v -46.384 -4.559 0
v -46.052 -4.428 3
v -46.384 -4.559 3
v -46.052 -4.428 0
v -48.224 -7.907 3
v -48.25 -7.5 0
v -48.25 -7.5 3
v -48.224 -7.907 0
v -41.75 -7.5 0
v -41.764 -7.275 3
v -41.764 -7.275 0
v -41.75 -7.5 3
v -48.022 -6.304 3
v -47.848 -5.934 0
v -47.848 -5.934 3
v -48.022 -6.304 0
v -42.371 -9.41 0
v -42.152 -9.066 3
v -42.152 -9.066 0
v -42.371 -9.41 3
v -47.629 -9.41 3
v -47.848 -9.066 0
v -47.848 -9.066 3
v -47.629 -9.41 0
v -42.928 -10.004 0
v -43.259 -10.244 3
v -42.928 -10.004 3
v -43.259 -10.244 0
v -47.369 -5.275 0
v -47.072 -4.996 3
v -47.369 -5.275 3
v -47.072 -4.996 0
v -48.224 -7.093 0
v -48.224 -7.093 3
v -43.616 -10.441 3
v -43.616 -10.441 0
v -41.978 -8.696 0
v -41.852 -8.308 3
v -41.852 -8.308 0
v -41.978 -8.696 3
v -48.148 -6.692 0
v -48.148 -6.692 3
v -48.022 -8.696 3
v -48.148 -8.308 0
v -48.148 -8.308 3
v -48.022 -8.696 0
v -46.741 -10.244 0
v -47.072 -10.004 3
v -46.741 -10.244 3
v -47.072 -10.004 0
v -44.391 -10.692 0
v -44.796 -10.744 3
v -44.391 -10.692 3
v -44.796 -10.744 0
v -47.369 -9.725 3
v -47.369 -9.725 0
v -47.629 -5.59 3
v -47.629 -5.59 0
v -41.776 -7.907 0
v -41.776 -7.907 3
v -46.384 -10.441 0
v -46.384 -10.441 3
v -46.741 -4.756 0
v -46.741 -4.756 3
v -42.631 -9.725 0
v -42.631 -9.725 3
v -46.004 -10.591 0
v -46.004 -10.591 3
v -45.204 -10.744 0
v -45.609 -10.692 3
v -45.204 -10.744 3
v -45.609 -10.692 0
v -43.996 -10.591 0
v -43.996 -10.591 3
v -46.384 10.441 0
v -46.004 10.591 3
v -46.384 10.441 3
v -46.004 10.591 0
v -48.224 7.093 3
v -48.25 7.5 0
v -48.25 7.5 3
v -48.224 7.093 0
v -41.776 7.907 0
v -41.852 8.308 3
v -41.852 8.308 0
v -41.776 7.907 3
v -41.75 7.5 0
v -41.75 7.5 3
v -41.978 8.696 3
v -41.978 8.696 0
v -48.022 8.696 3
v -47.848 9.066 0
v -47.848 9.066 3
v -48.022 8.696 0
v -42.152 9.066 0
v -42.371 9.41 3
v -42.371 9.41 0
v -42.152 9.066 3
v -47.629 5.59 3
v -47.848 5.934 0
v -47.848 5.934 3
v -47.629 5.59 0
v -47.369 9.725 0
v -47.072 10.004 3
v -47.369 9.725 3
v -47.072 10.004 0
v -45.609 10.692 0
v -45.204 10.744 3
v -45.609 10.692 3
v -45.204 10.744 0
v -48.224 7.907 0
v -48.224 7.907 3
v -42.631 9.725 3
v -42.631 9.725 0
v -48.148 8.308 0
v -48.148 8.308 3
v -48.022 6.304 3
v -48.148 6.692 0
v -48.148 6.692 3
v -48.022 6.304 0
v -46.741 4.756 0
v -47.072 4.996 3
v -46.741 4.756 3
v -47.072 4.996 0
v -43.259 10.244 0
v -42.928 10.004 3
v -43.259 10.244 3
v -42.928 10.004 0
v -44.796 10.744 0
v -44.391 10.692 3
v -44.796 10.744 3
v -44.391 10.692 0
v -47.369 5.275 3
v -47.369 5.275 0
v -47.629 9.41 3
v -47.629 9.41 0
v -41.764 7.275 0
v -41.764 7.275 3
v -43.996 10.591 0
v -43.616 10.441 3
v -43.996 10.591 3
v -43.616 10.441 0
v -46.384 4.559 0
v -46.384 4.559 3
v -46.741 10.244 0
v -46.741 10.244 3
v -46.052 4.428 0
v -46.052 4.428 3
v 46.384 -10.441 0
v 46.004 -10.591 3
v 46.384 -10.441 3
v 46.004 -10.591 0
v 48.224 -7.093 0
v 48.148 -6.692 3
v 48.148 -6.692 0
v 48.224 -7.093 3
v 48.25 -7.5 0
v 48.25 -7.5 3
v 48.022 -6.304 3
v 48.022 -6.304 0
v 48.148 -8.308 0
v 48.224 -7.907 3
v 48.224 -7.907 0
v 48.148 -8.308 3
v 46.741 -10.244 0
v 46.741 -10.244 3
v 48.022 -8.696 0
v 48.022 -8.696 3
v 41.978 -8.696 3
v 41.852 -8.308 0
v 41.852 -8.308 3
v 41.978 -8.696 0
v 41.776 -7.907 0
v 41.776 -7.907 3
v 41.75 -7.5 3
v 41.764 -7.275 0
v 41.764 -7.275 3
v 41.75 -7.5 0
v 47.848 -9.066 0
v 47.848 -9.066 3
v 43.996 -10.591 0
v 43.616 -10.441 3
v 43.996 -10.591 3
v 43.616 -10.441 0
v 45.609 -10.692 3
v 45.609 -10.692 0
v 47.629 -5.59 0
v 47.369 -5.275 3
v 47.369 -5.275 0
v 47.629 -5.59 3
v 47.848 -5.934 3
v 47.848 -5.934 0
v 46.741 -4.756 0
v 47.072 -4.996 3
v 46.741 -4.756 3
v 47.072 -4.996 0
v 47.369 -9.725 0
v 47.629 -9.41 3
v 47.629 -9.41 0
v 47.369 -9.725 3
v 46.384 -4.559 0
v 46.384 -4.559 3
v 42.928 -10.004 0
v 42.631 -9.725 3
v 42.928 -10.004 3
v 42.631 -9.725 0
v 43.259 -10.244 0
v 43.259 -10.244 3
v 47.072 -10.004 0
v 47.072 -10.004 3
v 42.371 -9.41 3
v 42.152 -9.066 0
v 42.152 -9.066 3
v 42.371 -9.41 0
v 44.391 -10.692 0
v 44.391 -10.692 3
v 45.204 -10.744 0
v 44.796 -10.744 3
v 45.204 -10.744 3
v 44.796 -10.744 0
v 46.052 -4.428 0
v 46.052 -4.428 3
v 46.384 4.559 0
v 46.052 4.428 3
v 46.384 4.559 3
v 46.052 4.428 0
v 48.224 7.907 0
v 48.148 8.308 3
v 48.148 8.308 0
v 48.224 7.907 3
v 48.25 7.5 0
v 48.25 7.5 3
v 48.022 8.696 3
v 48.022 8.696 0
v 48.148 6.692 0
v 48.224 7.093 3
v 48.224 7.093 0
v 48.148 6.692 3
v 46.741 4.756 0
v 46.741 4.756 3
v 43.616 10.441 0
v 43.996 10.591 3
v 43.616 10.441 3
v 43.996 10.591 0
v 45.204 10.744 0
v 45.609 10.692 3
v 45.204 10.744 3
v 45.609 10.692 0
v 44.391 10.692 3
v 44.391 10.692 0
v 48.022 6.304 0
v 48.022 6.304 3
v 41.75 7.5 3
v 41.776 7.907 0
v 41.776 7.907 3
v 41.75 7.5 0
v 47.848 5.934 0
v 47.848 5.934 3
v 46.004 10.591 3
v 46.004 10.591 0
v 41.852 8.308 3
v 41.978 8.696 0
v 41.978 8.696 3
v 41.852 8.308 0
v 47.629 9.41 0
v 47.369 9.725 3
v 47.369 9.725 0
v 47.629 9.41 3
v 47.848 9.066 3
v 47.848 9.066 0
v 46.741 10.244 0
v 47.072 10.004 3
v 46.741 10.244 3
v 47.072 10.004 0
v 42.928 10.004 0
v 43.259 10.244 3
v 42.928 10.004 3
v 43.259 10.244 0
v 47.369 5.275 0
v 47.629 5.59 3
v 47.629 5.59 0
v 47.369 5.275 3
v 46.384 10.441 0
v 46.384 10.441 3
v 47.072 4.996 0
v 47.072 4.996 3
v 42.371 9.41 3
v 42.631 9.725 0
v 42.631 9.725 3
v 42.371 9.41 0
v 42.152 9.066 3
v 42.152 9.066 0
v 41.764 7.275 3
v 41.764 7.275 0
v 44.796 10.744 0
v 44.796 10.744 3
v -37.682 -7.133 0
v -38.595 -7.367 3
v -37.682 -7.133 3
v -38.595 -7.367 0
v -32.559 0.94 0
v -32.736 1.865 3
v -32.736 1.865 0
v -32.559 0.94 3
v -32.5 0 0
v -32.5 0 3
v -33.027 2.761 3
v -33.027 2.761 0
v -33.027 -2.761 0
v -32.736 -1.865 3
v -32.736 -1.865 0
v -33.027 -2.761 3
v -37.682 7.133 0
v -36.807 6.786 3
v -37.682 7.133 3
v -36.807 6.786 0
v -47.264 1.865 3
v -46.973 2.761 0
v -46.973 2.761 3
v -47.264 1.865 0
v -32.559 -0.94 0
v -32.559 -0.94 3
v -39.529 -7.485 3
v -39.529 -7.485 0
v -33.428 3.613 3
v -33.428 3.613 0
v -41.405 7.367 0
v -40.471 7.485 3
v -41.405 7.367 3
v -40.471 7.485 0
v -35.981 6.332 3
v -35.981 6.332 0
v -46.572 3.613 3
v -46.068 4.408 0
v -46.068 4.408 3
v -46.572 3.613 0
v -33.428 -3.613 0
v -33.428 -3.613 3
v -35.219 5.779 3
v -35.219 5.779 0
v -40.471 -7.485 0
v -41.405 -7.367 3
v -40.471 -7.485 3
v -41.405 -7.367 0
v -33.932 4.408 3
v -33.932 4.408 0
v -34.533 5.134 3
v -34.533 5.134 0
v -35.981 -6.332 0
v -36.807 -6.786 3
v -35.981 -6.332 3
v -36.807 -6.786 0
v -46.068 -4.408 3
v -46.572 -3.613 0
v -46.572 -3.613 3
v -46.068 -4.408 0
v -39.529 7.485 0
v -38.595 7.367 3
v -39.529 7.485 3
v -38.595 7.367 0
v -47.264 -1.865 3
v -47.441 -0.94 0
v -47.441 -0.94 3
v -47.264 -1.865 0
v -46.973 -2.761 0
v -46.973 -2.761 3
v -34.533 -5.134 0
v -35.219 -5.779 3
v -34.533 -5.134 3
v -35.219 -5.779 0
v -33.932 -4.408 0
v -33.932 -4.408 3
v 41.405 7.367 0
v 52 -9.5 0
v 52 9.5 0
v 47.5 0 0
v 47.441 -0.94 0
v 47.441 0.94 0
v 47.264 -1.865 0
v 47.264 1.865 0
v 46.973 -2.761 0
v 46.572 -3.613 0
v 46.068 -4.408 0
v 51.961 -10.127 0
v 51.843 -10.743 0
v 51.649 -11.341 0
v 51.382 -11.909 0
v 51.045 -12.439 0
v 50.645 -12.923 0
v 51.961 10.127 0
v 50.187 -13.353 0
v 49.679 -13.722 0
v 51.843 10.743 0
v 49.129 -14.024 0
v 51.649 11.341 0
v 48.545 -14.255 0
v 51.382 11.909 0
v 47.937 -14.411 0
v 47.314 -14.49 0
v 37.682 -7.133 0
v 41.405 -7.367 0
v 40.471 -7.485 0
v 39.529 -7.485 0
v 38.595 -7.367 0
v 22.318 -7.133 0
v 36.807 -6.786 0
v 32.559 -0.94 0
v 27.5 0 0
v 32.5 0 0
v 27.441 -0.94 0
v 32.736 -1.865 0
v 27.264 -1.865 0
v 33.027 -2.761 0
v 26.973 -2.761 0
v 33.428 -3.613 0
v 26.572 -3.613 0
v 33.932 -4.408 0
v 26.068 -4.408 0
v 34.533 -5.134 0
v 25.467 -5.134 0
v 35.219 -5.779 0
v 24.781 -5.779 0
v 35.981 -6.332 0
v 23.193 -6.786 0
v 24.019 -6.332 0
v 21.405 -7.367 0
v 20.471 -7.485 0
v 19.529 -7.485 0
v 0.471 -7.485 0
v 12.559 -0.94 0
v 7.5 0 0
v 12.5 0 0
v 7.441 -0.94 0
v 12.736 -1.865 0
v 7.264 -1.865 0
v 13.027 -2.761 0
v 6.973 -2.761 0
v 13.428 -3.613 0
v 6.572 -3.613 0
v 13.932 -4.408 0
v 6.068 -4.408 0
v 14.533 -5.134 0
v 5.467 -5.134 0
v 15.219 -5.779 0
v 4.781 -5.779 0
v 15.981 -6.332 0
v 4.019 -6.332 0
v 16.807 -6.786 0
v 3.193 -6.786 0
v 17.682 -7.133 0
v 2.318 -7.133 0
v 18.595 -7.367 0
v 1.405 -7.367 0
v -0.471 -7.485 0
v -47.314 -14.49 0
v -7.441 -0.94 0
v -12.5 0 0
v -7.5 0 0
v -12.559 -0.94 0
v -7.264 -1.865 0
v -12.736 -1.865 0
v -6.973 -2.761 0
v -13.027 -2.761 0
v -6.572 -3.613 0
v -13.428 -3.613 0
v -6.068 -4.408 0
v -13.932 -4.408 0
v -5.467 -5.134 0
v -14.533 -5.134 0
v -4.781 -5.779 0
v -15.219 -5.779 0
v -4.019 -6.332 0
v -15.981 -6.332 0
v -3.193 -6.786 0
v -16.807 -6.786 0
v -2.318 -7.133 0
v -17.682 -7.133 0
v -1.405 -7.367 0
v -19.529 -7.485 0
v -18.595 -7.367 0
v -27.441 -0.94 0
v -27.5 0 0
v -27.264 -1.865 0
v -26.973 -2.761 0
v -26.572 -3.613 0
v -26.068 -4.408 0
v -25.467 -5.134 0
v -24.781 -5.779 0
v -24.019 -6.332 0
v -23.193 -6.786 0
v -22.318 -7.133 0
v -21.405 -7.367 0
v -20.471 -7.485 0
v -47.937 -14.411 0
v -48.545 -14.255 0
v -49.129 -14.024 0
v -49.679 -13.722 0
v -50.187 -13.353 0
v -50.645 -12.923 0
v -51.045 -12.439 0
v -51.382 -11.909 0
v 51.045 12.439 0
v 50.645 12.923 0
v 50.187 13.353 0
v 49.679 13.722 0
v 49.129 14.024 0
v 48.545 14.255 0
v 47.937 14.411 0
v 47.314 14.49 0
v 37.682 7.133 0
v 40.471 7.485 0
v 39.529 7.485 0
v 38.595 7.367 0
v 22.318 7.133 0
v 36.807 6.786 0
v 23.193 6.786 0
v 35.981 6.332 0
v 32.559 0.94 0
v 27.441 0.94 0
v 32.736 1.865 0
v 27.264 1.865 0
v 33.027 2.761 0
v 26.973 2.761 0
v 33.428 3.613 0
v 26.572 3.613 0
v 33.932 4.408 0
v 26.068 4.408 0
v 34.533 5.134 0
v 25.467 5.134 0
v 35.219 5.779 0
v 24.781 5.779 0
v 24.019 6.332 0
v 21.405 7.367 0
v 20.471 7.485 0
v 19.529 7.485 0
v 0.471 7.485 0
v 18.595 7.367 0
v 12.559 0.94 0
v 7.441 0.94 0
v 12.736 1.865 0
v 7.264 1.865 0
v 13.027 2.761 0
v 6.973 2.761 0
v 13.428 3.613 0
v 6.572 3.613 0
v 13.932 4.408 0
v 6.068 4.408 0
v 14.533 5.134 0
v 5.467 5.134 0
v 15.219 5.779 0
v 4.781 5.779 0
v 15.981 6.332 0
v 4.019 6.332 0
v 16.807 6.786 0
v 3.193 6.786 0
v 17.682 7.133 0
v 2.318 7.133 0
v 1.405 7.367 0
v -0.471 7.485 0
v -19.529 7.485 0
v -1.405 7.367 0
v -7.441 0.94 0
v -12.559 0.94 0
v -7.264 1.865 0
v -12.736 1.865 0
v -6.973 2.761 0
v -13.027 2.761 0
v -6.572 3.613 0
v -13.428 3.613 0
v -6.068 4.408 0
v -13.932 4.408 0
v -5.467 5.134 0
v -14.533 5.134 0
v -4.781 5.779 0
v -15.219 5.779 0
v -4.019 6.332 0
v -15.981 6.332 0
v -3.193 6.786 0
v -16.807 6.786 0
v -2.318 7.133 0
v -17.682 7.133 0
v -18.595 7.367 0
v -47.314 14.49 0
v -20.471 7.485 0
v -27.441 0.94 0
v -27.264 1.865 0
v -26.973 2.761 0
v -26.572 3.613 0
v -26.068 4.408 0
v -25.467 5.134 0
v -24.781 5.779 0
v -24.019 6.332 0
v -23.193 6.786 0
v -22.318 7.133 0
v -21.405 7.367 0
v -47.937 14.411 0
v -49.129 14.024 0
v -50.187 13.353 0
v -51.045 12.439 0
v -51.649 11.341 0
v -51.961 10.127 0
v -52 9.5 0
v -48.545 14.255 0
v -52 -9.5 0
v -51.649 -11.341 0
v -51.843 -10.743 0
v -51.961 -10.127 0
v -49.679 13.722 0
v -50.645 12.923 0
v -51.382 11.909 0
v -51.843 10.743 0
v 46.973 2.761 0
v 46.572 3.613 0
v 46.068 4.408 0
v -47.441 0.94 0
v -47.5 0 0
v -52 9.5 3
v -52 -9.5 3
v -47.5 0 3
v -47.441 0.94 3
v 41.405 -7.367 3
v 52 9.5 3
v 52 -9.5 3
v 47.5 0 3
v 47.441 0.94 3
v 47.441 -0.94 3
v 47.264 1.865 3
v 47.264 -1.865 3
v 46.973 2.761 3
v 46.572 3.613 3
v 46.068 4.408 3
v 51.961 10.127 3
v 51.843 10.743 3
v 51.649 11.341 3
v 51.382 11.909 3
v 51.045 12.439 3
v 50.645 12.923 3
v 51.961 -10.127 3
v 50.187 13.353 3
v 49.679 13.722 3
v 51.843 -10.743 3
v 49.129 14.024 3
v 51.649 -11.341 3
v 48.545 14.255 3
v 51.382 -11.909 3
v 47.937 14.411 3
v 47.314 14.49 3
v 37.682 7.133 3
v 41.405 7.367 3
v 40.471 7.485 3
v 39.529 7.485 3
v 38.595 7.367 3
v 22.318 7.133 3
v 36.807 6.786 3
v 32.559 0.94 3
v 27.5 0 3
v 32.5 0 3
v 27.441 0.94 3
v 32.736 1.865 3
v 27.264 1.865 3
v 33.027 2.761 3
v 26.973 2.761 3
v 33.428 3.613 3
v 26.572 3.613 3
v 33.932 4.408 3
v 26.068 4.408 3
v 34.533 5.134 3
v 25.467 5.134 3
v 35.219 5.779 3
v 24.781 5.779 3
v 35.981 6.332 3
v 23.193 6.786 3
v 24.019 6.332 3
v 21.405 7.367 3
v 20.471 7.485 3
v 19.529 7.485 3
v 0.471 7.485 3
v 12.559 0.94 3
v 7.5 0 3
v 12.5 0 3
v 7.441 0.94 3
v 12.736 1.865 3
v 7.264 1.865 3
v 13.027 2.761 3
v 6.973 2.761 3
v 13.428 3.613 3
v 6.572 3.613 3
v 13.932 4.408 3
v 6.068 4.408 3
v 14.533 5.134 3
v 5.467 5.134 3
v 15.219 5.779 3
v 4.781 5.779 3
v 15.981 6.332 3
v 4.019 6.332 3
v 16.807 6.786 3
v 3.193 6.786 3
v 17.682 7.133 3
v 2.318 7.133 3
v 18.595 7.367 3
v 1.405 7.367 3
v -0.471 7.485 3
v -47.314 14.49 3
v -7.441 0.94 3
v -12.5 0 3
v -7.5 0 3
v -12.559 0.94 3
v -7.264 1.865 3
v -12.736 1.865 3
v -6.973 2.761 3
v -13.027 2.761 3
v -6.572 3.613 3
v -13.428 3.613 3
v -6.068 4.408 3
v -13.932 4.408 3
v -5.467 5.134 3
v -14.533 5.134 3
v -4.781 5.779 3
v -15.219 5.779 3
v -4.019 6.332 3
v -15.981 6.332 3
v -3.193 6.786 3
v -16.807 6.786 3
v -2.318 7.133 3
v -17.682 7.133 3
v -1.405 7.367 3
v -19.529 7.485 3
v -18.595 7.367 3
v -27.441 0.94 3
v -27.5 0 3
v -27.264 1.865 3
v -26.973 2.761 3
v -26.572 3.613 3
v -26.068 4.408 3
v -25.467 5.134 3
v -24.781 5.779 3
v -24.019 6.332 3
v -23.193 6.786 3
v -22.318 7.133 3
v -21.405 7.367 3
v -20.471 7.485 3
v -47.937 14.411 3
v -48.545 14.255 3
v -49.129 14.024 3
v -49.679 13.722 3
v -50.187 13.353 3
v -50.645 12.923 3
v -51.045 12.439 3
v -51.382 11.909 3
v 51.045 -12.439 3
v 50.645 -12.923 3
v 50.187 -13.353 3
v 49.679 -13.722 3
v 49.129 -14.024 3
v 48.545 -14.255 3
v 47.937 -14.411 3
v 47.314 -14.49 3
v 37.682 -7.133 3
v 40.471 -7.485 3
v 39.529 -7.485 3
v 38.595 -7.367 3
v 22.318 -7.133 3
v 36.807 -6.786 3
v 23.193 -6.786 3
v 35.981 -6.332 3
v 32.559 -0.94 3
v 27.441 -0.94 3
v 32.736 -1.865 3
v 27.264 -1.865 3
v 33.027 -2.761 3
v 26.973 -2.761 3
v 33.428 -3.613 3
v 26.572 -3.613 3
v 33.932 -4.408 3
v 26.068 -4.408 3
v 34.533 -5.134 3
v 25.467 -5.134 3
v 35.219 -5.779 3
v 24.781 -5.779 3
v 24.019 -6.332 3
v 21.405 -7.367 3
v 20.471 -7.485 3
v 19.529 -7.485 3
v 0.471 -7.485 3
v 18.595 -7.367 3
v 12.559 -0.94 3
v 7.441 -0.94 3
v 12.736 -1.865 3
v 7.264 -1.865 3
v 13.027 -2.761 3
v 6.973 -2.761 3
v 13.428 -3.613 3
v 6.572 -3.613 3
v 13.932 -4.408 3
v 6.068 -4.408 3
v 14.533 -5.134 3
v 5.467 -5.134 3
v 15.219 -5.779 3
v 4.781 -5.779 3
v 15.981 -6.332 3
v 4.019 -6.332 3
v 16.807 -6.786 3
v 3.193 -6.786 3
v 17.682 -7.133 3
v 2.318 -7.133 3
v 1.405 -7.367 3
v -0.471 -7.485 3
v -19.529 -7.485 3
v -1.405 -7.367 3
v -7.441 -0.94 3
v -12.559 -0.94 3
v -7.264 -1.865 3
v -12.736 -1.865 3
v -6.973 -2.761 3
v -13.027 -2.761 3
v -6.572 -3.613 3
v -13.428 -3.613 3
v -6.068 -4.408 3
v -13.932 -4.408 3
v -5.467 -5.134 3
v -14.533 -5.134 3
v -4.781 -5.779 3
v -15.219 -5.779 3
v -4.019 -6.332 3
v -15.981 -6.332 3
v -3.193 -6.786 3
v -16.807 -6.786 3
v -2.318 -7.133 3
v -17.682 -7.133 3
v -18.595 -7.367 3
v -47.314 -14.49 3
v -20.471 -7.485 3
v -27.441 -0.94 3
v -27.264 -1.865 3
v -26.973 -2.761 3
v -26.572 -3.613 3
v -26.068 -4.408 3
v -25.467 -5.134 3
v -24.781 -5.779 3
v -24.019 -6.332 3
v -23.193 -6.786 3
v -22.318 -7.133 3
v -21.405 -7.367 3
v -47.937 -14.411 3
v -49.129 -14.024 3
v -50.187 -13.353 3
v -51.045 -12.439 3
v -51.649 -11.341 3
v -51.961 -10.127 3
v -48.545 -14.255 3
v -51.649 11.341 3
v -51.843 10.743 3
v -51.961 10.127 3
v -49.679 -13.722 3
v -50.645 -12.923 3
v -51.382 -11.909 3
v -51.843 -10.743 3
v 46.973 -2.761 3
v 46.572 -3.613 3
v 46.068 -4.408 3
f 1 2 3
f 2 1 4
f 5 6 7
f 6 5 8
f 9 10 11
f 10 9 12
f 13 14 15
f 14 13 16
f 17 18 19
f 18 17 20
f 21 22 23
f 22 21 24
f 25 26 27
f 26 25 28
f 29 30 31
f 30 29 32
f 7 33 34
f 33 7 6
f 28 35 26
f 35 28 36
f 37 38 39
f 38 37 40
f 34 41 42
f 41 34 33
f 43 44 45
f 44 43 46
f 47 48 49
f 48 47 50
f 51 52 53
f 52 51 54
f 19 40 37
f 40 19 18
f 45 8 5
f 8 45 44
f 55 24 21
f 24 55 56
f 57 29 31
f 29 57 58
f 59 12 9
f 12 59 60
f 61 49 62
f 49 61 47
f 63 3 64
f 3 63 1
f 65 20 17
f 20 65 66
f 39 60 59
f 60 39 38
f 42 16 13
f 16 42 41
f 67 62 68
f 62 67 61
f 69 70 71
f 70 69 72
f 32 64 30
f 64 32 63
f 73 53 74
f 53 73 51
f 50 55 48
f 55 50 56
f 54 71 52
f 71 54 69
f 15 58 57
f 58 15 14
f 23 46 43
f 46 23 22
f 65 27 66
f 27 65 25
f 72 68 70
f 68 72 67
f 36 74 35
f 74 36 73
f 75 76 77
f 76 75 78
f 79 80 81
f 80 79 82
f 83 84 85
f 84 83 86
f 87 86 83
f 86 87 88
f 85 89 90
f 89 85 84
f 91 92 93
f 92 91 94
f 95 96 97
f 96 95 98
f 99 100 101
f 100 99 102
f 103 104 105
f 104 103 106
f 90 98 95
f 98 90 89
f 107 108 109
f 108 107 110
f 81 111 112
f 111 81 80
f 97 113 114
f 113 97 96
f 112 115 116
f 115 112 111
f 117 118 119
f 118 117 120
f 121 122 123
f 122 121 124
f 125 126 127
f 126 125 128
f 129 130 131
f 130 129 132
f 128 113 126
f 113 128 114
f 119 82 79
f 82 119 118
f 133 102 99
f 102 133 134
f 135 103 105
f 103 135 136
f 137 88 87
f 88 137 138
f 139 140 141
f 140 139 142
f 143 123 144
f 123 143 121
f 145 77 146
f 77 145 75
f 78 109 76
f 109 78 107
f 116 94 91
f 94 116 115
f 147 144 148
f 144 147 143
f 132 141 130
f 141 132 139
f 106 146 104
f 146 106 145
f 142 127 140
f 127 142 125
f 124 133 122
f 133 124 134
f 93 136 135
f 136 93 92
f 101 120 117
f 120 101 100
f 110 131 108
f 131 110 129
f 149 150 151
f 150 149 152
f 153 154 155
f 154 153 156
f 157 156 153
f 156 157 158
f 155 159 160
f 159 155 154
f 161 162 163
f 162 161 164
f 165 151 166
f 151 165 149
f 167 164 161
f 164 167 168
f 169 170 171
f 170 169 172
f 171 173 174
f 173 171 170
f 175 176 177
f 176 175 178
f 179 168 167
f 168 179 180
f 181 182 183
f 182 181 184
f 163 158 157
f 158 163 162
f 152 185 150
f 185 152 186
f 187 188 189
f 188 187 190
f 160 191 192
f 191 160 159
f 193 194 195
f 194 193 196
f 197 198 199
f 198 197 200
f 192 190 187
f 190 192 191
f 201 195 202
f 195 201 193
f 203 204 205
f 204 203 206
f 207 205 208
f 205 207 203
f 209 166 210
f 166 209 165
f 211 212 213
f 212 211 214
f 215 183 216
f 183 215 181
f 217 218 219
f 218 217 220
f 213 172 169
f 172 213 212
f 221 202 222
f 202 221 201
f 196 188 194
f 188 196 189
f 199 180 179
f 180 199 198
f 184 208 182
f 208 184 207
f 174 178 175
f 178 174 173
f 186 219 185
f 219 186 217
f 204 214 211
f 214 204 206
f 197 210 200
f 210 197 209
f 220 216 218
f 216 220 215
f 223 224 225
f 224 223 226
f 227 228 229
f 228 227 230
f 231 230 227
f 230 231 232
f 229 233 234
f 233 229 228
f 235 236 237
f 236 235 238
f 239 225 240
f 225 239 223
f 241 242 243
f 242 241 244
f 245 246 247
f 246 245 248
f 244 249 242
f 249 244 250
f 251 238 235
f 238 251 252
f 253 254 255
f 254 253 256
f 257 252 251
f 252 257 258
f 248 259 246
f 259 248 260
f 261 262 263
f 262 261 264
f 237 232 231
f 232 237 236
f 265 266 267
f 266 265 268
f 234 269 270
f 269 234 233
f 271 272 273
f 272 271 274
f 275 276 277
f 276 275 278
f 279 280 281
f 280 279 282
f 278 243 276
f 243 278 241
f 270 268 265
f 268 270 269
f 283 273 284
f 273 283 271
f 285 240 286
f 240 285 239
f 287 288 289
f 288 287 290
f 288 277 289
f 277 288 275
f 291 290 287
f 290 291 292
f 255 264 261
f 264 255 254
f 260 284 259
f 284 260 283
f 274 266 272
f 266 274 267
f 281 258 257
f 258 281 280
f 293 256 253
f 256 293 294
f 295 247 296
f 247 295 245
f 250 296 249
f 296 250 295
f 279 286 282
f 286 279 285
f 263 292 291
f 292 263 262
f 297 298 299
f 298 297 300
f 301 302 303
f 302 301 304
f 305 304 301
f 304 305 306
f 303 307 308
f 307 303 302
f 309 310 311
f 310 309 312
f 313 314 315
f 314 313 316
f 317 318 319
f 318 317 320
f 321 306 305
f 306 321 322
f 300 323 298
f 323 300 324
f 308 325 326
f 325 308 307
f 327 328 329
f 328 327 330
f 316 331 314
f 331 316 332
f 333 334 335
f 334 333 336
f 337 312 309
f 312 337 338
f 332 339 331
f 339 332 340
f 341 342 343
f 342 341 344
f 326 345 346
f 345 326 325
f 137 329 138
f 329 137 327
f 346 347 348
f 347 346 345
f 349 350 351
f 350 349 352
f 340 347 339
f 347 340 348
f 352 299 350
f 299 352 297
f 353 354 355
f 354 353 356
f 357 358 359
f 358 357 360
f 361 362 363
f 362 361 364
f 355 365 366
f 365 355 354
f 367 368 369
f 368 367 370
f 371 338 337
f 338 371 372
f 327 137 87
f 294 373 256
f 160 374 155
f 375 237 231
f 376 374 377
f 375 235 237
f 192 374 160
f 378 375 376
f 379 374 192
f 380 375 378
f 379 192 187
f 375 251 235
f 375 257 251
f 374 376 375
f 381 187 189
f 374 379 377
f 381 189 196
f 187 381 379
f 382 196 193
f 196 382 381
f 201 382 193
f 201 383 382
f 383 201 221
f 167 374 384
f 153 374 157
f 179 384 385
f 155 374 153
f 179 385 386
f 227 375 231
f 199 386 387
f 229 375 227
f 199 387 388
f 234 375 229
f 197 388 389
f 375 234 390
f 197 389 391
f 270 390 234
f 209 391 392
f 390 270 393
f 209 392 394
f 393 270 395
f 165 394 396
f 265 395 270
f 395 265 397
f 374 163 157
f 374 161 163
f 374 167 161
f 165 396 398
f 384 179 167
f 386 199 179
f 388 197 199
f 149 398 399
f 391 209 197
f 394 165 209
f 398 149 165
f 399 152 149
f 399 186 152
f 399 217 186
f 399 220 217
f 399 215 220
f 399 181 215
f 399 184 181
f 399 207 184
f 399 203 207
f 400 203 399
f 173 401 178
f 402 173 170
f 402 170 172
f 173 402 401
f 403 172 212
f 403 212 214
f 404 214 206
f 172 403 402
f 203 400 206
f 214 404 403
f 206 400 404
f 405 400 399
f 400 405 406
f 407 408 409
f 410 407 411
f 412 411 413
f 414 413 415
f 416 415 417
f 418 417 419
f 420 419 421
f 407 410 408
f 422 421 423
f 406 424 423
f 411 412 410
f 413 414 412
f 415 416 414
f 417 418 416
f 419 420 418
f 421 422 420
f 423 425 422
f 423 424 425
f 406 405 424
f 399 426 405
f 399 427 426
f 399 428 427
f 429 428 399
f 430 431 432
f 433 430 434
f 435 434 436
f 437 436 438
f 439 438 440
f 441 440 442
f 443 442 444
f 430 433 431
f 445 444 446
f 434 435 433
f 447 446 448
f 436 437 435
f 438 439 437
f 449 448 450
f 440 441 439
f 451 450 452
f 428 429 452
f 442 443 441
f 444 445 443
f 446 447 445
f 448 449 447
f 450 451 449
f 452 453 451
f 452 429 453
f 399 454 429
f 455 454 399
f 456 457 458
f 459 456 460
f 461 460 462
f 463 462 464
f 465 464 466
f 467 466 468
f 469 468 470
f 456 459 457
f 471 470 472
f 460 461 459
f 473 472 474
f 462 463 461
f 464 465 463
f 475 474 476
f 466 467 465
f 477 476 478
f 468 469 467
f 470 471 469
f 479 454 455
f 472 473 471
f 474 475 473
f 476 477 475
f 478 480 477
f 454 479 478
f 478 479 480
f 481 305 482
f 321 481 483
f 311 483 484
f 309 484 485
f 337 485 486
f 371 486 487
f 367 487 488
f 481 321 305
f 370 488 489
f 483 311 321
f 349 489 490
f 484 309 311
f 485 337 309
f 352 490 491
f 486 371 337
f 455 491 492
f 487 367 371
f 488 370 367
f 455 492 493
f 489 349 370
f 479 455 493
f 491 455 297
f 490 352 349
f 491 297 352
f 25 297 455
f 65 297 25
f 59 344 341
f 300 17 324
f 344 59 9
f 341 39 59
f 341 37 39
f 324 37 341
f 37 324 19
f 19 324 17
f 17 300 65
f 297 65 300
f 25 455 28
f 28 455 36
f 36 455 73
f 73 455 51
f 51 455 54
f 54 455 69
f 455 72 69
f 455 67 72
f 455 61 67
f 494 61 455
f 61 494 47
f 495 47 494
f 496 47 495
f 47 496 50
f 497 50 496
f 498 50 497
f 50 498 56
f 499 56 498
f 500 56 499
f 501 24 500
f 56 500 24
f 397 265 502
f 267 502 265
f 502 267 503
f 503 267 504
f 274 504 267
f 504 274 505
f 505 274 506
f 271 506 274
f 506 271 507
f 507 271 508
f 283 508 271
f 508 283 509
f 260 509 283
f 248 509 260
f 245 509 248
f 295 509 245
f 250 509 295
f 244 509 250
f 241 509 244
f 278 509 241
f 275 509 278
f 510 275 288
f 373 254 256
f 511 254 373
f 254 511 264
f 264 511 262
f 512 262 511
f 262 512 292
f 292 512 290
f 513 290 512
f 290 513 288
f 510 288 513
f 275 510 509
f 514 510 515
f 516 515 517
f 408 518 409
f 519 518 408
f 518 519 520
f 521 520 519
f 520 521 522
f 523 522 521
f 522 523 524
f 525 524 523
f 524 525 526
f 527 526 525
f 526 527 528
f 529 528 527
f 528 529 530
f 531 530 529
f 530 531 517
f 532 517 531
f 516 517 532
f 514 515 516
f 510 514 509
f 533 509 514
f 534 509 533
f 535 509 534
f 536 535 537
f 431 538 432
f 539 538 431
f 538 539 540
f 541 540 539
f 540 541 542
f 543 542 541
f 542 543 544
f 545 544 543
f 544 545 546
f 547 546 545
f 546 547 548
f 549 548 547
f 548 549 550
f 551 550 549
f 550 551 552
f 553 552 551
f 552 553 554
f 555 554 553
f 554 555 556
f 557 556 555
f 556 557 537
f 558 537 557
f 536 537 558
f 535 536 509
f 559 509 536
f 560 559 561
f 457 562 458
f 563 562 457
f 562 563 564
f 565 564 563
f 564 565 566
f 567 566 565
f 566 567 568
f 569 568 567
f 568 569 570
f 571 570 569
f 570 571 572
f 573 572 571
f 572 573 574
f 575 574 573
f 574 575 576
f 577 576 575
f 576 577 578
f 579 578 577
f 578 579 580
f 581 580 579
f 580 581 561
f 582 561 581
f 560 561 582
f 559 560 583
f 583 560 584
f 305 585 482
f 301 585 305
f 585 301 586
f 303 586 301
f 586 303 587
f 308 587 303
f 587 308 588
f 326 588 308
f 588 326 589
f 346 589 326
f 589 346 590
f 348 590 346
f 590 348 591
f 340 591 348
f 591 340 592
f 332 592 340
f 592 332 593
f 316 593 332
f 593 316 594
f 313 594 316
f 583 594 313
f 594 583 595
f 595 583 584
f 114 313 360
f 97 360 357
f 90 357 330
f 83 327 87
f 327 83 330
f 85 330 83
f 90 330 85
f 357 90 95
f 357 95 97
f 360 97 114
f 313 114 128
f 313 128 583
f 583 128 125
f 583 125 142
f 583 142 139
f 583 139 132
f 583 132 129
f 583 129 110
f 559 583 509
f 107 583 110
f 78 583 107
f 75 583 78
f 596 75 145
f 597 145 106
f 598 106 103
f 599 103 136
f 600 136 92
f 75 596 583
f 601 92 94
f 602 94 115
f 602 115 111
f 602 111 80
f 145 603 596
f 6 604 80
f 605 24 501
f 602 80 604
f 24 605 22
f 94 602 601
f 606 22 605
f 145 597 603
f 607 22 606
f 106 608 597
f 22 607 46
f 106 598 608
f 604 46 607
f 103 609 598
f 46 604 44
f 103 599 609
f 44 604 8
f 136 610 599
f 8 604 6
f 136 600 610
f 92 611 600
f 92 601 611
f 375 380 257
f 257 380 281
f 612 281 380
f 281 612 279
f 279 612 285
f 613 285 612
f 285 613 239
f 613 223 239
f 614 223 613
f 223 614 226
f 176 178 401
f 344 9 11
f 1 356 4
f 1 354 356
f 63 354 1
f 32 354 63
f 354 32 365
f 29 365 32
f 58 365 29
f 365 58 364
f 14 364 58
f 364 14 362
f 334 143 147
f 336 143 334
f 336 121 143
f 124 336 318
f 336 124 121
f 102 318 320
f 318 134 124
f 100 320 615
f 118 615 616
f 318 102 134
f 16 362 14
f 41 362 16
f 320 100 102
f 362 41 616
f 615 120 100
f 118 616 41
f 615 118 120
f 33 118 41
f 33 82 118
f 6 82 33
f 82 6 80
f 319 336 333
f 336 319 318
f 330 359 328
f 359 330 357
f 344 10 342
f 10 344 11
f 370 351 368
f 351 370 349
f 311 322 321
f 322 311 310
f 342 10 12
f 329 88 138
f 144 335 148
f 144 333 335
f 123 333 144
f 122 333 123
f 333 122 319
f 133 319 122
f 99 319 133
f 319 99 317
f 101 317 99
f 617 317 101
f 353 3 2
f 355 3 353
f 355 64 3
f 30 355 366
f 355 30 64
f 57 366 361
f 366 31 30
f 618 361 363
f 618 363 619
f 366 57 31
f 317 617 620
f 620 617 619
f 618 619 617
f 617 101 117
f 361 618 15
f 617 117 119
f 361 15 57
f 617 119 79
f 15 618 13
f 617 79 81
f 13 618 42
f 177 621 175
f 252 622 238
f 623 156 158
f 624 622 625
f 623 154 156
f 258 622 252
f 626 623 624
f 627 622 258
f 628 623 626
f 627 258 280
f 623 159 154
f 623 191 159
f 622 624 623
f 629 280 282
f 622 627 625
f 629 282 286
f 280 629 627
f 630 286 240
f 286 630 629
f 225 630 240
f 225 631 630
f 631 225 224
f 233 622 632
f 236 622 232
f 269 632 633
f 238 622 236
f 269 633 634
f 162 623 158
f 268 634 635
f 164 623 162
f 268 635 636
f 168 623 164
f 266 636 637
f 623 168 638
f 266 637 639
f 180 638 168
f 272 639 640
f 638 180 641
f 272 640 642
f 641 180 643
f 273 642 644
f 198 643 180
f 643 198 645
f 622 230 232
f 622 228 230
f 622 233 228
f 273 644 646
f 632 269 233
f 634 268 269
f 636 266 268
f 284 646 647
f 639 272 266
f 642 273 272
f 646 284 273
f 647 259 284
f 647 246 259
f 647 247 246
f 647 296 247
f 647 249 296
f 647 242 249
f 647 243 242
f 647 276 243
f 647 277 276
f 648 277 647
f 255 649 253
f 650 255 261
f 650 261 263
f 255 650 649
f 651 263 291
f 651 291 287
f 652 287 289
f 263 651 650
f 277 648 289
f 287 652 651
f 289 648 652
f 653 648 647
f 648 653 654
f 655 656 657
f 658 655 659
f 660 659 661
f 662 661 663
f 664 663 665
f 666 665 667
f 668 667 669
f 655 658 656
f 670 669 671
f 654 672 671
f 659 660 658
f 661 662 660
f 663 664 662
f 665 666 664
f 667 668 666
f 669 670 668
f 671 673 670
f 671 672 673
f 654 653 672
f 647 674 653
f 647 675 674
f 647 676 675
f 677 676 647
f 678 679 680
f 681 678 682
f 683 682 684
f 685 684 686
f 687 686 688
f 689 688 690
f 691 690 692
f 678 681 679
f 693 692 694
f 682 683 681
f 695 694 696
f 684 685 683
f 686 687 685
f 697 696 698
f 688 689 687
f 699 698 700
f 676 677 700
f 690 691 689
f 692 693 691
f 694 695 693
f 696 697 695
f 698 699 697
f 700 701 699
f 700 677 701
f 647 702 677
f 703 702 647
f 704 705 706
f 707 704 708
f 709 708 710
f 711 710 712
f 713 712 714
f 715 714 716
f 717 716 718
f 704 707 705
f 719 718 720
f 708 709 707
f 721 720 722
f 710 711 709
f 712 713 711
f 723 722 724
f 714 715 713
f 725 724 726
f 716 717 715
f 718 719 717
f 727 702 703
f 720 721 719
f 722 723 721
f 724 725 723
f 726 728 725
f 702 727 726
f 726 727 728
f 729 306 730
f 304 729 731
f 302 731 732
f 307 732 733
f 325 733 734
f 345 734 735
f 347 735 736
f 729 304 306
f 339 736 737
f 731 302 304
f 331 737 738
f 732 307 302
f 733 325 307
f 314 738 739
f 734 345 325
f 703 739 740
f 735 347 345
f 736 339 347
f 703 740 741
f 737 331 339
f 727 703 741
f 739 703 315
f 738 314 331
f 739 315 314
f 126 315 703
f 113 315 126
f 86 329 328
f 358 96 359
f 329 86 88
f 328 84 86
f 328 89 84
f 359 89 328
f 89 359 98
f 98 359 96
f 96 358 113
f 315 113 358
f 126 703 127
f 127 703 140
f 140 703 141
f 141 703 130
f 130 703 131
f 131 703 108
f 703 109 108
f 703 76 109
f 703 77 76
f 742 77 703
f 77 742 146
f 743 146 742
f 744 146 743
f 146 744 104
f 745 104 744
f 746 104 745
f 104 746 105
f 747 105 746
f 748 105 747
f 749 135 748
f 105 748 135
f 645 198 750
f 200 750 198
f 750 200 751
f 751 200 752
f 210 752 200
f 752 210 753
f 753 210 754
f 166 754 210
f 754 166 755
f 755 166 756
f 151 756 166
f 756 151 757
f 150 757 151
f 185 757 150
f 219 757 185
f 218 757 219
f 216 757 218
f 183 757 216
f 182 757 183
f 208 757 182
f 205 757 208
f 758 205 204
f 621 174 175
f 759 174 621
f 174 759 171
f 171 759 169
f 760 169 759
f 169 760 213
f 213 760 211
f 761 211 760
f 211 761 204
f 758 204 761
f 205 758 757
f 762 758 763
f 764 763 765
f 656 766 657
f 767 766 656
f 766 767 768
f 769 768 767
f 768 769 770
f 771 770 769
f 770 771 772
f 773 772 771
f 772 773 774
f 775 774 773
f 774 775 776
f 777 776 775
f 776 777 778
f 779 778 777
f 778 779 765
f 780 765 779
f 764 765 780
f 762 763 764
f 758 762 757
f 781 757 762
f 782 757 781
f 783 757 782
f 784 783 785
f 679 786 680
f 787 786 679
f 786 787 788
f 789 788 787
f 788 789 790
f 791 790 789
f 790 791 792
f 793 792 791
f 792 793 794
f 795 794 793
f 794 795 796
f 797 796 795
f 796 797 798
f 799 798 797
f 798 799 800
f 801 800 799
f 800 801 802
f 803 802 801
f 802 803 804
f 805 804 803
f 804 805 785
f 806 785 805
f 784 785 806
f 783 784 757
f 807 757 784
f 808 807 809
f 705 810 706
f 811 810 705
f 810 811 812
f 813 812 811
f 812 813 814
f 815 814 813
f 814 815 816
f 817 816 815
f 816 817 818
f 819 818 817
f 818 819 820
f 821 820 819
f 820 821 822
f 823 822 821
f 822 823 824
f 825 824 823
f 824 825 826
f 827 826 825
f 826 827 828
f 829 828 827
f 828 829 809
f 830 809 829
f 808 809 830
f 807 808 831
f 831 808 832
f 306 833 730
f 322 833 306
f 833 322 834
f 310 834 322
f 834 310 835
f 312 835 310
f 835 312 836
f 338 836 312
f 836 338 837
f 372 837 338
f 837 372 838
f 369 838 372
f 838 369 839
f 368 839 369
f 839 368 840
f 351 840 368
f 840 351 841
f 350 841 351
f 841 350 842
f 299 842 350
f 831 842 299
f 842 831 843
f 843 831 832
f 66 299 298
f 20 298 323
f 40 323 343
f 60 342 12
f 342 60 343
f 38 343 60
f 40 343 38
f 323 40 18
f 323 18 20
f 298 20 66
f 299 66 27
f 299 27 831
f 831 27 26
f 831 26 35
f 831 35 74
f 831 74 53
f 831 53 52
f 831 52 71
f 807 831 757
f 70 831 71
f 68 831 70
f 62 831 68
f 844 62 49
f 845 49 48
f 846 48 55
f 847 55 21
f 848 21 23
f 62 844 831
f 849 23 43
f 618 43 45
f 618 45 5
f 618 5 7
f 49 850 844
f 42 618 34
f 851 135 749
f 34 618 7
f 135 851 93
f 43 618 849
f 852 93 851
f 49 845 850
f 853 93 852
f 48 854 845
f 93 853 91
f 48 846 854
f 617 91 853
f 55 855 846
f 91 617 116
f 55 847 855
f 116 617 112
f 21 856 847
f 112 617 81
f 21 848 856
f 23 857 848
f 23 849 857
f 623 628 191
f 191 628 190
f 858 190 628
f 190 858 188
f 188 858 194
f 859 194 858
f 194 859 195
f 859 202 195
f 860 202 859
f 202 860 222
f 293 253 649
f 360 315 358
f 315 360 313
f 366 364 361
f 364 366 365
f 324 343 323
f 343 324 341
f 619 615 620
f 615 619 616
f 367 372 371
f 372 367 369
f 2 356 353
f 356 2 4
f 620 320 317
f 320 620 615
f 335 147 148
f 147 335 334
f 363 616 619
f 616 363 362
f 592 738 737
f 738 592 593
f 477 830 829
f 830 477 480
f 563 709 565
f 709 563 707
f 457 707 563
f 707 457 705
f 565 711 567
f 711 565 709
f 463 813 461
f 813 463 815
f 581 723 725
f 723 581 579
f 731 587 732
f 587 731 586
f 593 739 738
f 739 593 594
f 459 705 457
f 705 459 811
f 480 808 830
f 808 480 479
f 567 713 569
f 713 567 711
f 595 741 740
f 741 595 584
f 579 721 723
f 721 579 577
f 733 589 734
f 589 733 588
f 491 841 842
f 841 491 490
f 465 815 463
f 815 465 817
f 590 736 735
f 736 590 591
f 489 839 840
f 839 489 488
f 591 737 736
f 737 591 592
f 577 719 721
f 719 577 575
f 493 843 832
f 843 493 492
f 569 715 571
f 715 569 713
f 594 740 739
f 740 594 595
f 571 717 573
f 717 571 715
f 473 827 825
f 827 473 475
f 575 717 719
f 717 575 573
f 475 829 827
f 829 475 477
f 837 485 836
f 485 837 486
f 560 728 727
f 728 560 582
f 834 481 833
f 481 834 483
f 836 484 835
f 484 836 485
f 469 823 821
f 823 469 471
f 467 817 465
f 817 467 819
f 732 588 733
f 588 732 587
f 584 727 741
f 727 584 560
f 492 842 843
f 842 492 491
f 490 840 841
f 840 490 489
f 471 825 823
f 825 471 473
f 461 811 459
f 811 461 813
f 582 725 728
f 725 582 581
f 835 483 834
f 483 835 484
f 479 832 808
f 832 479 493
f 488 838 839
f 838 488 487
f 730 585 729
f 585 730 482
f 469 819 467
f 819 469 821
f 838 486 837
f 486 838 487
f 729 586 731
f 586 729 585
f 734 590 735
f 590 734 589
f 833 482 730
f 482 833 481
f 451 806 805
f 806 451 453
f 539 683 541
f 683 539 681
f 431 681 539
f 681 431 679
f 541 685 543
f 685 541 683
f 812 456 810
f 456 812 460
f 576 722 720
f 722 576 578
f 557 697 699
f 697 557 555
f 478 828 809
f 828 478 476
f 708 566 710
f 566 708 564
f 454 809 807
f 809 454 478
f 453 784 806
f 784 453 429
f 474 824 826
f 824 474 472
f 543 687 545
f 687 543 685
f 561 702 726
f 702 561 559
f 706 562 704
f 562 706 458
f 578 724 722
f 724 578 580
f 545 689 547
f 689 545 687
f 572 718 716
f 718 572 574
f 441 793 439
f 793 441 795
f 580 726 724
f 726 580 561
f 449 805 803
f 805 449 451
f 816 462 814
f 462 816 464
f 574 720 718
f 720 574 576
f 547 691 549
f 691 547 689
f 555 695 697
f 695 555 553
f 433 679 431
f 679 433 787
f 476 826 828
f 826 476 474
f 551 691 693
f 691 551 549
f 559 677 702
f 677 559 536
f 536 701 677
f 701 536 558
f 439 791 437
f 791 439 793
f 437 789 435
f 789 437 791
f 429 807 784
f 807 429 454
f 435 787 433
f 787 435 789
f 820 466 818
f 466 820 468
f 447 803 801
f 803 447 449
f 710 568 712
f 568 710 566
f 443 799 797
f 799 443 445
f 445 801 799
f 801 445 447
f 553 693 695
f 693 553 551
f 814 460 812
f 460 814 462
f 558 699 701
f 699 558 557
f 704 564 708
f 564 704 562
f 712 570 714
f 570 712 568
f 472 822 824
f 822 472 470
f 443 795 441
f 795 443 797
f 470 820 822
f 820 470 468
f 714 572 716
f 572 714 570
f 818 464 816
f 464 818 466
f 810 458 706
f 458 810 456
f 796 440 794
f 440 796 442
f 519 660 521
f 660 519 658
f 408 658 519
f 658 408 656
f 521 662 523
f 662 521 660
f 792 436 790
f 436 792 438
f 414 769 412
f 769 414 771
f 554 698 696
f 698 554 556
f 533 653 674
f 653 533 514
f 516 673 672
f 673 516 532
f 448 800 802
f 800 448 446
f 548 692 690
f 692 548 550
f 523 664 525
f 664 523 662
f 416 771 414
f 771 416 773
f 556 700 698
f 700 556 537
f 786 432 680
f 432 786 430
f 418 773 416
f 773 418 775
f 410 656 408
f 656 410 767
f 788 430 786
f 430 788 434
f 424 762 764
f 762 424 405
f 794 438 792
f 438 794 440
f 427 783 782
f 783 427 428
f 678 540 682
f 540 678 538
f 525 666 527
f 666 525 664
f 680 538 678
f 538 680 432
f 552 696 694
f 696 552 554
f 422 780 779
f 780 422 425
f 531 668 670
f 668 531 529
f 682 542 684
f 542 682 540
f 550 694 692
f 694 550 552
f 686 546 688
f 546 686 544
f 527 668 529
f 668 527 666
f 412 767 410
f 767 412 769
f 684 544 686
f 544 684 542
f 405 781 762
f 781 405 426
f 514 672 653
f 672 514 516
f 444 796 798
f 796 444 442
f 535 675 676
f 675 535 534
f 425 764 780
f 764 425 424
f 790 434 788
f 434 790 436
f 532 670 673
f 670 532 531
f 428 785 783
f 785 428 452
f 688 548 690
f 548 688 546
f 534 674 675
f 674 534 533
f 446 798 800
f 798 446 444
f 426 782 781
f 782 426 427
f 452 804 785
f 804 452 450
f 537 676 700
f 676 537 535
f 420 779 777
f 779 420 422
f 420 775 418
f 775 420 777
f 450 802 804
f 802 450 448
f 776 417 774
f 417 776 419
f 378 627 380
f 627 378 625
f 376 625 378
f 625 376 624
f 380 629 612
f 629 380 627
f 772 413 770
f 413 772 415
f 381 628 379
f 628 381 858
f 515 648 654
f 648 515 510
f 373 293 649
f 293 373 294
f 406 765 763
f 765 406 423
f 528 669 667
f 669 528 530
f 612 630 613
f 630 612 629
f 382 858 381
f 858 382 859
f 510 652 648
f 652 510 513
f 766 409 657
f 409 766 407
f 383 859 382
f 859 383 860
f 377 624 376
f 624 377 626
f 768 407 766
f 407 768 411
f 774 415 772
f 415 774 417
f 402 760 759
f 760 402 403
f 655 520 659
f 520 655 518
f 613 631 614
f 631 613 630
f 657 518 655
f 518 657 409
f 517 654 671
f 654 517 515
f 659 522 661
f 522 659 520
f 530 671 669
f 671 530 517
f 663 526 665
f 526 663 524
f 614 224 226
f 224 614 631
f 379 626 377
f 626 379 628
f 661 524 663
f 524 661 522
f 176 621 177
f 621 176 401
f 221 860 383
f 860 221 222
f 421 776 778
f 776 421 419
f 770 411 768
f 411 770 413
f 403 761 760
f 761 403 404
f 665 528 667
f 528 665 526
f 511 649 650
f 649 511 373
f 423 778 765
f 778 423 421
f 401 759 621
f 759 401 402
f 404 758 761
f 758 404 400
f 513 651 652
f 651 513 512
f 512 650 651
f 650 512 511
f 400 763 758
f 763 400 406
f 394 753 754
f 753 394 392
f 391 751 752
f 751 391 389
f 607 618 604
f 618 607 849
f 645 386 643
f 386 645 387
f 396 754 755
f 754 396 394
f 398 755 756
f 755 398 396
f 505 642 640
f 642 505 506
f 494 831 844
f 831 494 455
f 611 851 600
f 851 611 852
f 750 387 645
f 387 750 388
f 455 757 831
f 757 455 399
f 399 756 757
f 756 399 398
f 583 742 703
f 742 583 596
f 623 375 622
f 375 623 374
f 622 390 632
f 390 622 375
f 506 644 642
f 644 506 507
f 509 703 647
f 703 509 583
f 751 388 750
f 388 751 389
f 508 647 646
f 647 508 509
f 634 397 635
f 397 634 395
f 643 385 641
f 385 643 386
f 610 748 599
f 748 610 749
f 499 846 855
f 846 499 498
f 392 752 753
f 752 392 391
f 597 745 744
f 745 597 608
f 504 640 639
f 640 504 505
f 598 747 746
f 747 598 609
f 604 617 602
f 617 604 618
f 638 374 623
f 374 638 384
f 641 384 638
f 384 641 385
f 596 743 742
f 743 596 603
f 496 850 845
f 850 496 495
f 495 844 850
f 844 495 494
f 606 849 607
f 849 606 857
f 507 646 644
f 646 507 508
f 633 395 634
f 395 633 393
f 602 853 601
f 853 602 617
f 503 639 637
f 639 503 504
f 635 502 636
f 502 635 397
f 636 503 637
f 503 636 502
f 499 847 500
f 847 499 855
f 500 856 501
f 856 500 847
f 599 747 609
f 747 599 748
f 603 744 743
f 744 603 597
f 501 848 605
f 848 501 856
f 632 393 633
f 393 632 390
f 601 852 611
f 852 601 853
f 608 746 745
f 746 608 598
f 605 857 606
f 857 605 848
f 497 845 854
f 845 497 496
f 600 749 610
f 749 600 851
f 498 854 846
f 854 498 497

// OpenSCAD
$fn = 50;


difference() {
	union() {
		hull() {
			translate(v = [-47.0000000000, 9.5000000000, 0]) {
				cylinder(h = 3, r = 5);
			}
			translate(v = [47.0000000000, 9.5000000000, 0]) {
				cylinder(h = 3, r = 5);
			}
			translate(v = [-47.0000000000, -9.5000000000, 0]) {
				cylinder(h = 3, r = 5);
			}
			translate(v = [47.0000000000, -9.5000000000, 0]) {
				cylinder(h = 3, r = 5);
			}
		}
	}
	union() {
		#translate(v = [-45.0000000000, -7.5000000000, -100.0000000000]) {
			cylinder(h = 200, r = 3.2500000000);
		}
		#translate(v = [-45.0000000000, 7.5000000000, -100.0000000000]) {
			cylinder(h = 200, r = 3.2500000000);
		}
		#translate(v = [45.0000000000, -7.5000000000, -100.0000000000]) {
			cylinder(h = 200, r = 3.2500000000);
		}
		#translate(v = [45.0000000000, 7.5000000000, -100.0000000000]) {
			cylinder(h = 200, r = 3.2500000000);
		}
		#translate(v = [-40.0000000000, 0, 0]) {
			cylinder(h = 3, r = 7.5000000000);
		}
		#translate(v = [-20.0000000000, 0, 0]) {
			cylinder(h = 3, r = 7.5000000000);
		}
		#cylinder(h = 3, r = 7.5000000000);
		#translate(v = [20.0000000000, 0, 0]) {
			cylinder(h = 3, r = 7.5000000000);
		}
		#translate(v = [40.0000000000, 0, 0]) {
			cylinder(h = 3, r = 7.5000000000);
		}
	}
}
